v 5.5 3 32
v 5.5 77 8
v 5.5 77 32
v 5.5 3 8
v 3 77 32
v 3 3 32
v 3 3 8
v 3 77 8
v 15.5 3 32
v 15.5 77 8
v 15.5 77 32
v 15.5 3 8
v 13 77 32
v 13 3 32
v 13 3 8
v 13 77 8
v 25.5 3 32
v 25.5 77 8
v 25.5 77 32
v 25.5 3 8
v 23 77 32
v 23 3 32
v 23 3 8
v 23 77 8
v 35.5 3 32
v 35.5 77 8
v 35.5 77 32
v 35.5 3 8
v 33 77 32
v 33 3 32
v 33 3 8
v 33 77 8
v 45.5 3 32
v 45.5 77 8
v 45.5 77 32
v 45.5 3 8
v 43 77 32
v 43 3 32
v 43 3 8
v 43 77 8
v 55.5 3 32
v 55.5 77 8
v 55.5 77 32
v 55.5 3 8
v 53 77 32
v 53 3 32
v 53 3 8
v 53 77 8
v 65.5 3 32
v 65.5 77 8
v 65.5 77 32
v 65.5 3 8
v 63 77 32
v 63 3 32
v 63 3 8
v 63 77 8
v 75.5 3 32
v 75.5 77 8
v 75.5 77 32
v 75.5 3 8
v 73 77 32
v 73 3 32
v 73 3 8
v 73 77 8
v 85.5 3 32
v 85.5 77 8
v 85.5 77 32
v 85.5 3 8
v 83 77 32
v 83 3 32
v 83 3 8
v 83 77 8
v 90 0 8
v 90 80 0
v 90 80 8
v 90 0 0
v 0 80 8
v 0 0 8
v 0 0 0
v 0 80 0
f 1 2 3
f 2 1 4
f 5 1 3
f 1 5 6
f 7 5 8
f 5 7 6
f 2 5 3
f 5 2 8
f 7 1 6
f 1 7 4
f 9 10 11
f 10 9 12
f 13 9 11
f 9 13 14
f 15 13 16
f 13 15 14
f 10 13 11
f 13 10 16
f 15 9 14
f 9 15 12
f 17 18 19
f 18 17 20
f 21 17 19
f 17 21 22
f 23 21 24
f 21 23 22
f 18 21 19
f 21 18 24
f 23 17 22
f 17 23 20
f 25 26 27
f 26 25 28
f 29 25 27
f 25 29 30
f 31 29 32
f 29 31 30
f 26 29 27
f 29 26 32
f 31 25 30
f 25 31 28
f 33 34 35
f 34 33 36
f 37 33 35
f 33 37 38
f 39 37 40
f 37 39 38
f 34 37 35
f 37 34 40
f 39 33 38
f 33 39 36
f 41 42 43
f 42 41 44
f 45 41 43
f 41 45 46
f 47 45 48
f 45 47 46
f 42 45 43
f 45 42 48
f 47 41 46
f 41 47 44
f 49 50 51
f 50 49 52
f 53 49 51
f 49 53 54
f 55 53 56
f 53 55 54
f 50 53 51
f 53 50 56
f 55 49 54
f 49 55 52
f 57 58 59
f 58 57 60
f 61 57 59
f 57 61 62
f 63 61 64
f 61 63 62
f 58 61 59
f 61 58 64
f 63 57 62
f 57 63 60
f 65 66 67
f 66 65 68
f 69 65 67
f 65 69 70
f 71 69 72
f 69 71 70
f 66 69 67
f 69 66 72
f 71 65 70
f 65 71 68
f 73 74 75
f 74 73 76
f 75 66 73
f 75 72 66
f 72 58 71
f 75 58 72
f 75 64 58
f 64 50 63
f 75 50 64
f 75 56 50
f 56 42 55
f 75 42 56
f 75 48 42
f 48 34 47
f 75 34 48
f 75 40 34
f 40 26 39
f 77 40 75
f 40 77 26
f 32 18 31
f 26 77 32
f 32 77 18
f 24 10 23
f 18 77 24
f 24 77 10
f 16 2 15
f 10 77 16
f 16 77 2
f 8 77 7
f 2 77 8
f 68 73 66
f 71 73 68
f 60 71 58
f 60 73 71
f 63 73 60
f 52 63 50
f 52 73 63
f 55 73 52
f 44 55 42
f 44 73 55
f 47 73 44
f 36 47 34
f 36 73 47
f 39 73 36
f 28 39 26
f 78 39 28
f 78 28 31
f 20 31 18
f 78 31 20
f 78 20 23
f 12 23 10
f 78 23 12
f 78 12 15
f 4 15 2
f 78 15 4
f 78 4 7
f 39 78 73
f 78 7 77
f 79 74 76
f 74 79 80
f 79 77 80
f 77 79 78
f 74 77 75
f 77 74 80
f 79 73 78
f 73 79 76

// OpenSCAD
$fn = 32;

// ----------------------------------------------------------------------
// Heatsink: uniform fin block
// ----------------------------------------------------------------------

// --- parameters (mm) ---
base_l = 90;              // base length, X
base_w = 80;              // base width, Y
base_t = 8;               // base plate thickness
fin_h = 25;               // fin height above the base
fin_t = 2.5;              // fin thickness
edge = 3;                 // margin from the base ends
pitch = 10;               // fin pitch

n_fins = floor((base_l - 2 * edge - fin_t) / pitch) + 1;  // fin count
total_h = base_t + fin_h - 1;  // overall height

union() {
  cube([base_l, base_w, base_t]);
  for (i = [0 : n_fins - 1])
    translate([edge + i * pitch, edge, base_t - 1])
      cube([fin_t, base_w - 2 * edge, fin_h]);
}
